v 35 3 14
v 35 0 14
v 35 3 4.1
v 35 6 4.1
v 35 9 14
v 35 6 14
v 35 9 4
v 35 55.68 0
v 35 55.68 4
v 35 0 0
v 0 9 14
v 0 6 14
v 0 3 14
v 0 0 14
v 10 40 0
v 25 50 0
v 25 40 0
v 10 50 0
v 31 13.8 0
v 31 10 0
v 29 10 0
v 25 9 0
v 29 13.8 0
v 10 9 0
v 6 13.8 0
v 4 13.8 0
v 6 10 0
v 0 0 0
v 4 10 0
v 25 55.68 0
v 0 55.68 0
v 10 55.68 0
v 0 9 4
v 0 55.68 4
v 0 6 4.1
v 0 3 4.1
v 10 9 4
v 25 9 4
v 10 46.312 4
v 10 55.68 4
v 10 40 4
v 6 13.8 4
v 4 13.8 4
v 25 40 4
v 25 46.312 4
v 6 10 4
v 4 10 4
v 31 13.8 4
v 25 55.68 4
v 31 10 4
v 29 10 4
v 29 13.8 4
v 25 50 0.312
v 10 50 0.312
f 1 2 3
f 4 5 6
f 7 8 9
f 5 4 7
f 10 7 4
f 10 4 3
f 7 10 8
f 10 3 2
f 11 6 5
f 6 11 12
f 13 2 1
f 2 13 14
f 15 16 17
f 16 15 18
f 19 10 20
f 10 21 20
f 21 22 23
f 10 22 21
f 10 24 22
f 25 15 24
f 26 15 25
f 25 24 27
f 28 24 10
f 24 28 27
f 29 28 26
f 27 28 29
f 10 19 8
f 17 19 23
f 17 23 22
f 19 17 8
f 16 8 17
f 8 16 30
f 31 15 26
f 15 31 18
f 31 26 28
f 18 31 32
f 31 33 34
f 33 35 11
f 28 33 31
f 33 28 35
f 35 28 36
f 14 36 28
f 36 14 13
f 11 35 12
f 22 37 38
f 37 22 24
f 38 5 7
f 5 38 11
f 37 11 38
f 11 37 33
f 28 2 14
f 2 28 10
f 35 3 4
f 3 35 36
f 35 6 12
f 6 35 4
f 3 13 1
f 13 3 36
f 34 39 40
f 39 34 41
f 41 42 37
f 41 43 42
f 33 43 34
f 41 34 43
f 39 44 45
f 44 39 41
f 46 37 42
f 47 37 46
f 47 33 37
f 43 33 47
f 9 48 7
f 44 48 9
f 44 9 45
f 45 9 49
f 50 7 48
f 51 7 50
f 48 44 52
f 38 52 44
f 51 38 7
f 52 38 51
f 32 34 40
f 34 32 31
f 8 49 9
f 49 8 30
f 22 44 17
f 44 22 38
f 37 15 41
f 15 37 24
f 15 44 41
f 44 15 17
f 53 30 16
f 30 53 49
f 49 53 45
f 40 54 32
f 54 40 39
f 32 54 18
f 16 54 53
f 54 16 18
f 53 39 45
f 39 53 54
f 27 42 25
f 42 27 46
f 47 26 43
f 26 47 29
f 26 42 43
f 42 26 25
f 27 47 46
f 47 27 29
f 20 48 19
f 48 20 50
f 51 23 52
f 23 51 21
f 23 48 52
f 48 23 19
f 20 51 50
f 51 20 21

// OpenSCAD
module base () {

	difference () {
		cube( [ 35, 9, 14 ] );
		translate( [ -0.1, 3, 4.1 ] )
			cube( [ 35.2, 3, 14.1 ] );		
	}
	difference () {
		cube( [ 35, 50 + 4 * 1.42, 4 ] );
		translate ( [ 10, 0, -0.1 ] )
			cube( [ 15, 40, 4.3 ] );
		translate ( [ 10, 50, -0.1 ] )
			cube( [ 15, 26, 4.3 ] );
		translate( [ 17.5, 50.3 + 2 * 1.42, 0 ] )
			rotate( [ 135, 0, 0 ] )
				cube( [ 15, 50, 4 ], center = true );
		translate( [ 4, 10, -0.1 ] )
			cube( [ 2, 3.8, 4.2 ] );
		translate( [ 29, 10, -0.1 ] )
			cube( [ 2, 3.8, 4.2 ] );
	}
}

module hipotenusa () {

	difference (){
		translate( [ 0, 0, 34 ] )
			cube( [ 35, 9, 13 ] );
		translate( [ -0.1, 3, 33.9 ] )
			cube( [ 35.2, 3, 10.1 ] );
	}

	difference (){
		translate( [ 0, 50.3 + 4 * 1.42, 0 ] )
			rotate( [ 135, 0, 0 ] )
			difference () {
				translate( [ 0, -5, 0 ] )
					cube( [ 35, 46 * 1.42 + 6.1, 4 ] );
				translate( [ 10, 15, -0.1 ] )
					cube( [ 15, 46 * 1.42 + 6.1 - 30, 4.2 ] );
				translate( [ 4, 15 + ( 46 * 1.42 + 6.1 - 30 )/ 2 - 1.9, -0.1 ] )
					cube( [ 2, 3.8, 4.2 ] );
				translate( [ 29, 15 + ( 46 * 1.42 + 6.1 - 30 )/ 2 - 1.9, -0.1 ] )
					cube( [ 2, 3.8, 4.2 ] );
				translate( [ 25, 15 + ( 46 * 1.42 + 6.1 - 30 )/ 2 - 1.9, -0.1 ] )
					cube( [ 4, 3.8, 1 ] );
				translate( [ 6, 15 + ( 46 * 1.42 + 6.1 - 30 )/ 2 - 1.9, -0.1 ] )
					cube( [ 4, 3.8, 1 ] );
				translate( [ 35 / 2 + 23 / 2, 15 + ( 46 * 1.42 + 6.1 - 30 )/ 2 + 23 / 2, -0.1 ] )
					cylinder( r = 2, h = 4.2, $fn = 20 );
				translate( [ 35 / 2 + 23 / 2, 15 + ( 46 * 1.42 + 6.1 - 30 )/ 2 - 23 / 2, -0.1 ] )
					cylinder( r = 2, h = 4.2, $fn = 20 );
				translate( [ 35 / 2 - 23 / 2, 15 + ( 46 * 1.42 + 6.1 - 30 )/ 2 + 23 / 2, -0.1 ] )
					cylinder( r = 2, h = 4.2, $fn = 20 );
				translate( [ 35 / 2 - 23 / 2, 15 + ( 46 * 1.42 + 6.1 - 30 )/ 2 - 23 / 2, -0.1 ] )
					cylinder( r = 2, h = 4.2, $fn = 20 );
			}
		base();
	}
}

//base();
//rotate( [ -135, 0, 0 ] )
//	color( [ 0, 0, 1 ] ) hipotenusa();
base();
//color( [ 1, 0, 0 ] ) base();
//hipotenusa();

//translate( [ -5, 3, 4 ] )
//	color( [ 0, 0, 0 ] ) cube( [ 100, 3, 40 ] );
